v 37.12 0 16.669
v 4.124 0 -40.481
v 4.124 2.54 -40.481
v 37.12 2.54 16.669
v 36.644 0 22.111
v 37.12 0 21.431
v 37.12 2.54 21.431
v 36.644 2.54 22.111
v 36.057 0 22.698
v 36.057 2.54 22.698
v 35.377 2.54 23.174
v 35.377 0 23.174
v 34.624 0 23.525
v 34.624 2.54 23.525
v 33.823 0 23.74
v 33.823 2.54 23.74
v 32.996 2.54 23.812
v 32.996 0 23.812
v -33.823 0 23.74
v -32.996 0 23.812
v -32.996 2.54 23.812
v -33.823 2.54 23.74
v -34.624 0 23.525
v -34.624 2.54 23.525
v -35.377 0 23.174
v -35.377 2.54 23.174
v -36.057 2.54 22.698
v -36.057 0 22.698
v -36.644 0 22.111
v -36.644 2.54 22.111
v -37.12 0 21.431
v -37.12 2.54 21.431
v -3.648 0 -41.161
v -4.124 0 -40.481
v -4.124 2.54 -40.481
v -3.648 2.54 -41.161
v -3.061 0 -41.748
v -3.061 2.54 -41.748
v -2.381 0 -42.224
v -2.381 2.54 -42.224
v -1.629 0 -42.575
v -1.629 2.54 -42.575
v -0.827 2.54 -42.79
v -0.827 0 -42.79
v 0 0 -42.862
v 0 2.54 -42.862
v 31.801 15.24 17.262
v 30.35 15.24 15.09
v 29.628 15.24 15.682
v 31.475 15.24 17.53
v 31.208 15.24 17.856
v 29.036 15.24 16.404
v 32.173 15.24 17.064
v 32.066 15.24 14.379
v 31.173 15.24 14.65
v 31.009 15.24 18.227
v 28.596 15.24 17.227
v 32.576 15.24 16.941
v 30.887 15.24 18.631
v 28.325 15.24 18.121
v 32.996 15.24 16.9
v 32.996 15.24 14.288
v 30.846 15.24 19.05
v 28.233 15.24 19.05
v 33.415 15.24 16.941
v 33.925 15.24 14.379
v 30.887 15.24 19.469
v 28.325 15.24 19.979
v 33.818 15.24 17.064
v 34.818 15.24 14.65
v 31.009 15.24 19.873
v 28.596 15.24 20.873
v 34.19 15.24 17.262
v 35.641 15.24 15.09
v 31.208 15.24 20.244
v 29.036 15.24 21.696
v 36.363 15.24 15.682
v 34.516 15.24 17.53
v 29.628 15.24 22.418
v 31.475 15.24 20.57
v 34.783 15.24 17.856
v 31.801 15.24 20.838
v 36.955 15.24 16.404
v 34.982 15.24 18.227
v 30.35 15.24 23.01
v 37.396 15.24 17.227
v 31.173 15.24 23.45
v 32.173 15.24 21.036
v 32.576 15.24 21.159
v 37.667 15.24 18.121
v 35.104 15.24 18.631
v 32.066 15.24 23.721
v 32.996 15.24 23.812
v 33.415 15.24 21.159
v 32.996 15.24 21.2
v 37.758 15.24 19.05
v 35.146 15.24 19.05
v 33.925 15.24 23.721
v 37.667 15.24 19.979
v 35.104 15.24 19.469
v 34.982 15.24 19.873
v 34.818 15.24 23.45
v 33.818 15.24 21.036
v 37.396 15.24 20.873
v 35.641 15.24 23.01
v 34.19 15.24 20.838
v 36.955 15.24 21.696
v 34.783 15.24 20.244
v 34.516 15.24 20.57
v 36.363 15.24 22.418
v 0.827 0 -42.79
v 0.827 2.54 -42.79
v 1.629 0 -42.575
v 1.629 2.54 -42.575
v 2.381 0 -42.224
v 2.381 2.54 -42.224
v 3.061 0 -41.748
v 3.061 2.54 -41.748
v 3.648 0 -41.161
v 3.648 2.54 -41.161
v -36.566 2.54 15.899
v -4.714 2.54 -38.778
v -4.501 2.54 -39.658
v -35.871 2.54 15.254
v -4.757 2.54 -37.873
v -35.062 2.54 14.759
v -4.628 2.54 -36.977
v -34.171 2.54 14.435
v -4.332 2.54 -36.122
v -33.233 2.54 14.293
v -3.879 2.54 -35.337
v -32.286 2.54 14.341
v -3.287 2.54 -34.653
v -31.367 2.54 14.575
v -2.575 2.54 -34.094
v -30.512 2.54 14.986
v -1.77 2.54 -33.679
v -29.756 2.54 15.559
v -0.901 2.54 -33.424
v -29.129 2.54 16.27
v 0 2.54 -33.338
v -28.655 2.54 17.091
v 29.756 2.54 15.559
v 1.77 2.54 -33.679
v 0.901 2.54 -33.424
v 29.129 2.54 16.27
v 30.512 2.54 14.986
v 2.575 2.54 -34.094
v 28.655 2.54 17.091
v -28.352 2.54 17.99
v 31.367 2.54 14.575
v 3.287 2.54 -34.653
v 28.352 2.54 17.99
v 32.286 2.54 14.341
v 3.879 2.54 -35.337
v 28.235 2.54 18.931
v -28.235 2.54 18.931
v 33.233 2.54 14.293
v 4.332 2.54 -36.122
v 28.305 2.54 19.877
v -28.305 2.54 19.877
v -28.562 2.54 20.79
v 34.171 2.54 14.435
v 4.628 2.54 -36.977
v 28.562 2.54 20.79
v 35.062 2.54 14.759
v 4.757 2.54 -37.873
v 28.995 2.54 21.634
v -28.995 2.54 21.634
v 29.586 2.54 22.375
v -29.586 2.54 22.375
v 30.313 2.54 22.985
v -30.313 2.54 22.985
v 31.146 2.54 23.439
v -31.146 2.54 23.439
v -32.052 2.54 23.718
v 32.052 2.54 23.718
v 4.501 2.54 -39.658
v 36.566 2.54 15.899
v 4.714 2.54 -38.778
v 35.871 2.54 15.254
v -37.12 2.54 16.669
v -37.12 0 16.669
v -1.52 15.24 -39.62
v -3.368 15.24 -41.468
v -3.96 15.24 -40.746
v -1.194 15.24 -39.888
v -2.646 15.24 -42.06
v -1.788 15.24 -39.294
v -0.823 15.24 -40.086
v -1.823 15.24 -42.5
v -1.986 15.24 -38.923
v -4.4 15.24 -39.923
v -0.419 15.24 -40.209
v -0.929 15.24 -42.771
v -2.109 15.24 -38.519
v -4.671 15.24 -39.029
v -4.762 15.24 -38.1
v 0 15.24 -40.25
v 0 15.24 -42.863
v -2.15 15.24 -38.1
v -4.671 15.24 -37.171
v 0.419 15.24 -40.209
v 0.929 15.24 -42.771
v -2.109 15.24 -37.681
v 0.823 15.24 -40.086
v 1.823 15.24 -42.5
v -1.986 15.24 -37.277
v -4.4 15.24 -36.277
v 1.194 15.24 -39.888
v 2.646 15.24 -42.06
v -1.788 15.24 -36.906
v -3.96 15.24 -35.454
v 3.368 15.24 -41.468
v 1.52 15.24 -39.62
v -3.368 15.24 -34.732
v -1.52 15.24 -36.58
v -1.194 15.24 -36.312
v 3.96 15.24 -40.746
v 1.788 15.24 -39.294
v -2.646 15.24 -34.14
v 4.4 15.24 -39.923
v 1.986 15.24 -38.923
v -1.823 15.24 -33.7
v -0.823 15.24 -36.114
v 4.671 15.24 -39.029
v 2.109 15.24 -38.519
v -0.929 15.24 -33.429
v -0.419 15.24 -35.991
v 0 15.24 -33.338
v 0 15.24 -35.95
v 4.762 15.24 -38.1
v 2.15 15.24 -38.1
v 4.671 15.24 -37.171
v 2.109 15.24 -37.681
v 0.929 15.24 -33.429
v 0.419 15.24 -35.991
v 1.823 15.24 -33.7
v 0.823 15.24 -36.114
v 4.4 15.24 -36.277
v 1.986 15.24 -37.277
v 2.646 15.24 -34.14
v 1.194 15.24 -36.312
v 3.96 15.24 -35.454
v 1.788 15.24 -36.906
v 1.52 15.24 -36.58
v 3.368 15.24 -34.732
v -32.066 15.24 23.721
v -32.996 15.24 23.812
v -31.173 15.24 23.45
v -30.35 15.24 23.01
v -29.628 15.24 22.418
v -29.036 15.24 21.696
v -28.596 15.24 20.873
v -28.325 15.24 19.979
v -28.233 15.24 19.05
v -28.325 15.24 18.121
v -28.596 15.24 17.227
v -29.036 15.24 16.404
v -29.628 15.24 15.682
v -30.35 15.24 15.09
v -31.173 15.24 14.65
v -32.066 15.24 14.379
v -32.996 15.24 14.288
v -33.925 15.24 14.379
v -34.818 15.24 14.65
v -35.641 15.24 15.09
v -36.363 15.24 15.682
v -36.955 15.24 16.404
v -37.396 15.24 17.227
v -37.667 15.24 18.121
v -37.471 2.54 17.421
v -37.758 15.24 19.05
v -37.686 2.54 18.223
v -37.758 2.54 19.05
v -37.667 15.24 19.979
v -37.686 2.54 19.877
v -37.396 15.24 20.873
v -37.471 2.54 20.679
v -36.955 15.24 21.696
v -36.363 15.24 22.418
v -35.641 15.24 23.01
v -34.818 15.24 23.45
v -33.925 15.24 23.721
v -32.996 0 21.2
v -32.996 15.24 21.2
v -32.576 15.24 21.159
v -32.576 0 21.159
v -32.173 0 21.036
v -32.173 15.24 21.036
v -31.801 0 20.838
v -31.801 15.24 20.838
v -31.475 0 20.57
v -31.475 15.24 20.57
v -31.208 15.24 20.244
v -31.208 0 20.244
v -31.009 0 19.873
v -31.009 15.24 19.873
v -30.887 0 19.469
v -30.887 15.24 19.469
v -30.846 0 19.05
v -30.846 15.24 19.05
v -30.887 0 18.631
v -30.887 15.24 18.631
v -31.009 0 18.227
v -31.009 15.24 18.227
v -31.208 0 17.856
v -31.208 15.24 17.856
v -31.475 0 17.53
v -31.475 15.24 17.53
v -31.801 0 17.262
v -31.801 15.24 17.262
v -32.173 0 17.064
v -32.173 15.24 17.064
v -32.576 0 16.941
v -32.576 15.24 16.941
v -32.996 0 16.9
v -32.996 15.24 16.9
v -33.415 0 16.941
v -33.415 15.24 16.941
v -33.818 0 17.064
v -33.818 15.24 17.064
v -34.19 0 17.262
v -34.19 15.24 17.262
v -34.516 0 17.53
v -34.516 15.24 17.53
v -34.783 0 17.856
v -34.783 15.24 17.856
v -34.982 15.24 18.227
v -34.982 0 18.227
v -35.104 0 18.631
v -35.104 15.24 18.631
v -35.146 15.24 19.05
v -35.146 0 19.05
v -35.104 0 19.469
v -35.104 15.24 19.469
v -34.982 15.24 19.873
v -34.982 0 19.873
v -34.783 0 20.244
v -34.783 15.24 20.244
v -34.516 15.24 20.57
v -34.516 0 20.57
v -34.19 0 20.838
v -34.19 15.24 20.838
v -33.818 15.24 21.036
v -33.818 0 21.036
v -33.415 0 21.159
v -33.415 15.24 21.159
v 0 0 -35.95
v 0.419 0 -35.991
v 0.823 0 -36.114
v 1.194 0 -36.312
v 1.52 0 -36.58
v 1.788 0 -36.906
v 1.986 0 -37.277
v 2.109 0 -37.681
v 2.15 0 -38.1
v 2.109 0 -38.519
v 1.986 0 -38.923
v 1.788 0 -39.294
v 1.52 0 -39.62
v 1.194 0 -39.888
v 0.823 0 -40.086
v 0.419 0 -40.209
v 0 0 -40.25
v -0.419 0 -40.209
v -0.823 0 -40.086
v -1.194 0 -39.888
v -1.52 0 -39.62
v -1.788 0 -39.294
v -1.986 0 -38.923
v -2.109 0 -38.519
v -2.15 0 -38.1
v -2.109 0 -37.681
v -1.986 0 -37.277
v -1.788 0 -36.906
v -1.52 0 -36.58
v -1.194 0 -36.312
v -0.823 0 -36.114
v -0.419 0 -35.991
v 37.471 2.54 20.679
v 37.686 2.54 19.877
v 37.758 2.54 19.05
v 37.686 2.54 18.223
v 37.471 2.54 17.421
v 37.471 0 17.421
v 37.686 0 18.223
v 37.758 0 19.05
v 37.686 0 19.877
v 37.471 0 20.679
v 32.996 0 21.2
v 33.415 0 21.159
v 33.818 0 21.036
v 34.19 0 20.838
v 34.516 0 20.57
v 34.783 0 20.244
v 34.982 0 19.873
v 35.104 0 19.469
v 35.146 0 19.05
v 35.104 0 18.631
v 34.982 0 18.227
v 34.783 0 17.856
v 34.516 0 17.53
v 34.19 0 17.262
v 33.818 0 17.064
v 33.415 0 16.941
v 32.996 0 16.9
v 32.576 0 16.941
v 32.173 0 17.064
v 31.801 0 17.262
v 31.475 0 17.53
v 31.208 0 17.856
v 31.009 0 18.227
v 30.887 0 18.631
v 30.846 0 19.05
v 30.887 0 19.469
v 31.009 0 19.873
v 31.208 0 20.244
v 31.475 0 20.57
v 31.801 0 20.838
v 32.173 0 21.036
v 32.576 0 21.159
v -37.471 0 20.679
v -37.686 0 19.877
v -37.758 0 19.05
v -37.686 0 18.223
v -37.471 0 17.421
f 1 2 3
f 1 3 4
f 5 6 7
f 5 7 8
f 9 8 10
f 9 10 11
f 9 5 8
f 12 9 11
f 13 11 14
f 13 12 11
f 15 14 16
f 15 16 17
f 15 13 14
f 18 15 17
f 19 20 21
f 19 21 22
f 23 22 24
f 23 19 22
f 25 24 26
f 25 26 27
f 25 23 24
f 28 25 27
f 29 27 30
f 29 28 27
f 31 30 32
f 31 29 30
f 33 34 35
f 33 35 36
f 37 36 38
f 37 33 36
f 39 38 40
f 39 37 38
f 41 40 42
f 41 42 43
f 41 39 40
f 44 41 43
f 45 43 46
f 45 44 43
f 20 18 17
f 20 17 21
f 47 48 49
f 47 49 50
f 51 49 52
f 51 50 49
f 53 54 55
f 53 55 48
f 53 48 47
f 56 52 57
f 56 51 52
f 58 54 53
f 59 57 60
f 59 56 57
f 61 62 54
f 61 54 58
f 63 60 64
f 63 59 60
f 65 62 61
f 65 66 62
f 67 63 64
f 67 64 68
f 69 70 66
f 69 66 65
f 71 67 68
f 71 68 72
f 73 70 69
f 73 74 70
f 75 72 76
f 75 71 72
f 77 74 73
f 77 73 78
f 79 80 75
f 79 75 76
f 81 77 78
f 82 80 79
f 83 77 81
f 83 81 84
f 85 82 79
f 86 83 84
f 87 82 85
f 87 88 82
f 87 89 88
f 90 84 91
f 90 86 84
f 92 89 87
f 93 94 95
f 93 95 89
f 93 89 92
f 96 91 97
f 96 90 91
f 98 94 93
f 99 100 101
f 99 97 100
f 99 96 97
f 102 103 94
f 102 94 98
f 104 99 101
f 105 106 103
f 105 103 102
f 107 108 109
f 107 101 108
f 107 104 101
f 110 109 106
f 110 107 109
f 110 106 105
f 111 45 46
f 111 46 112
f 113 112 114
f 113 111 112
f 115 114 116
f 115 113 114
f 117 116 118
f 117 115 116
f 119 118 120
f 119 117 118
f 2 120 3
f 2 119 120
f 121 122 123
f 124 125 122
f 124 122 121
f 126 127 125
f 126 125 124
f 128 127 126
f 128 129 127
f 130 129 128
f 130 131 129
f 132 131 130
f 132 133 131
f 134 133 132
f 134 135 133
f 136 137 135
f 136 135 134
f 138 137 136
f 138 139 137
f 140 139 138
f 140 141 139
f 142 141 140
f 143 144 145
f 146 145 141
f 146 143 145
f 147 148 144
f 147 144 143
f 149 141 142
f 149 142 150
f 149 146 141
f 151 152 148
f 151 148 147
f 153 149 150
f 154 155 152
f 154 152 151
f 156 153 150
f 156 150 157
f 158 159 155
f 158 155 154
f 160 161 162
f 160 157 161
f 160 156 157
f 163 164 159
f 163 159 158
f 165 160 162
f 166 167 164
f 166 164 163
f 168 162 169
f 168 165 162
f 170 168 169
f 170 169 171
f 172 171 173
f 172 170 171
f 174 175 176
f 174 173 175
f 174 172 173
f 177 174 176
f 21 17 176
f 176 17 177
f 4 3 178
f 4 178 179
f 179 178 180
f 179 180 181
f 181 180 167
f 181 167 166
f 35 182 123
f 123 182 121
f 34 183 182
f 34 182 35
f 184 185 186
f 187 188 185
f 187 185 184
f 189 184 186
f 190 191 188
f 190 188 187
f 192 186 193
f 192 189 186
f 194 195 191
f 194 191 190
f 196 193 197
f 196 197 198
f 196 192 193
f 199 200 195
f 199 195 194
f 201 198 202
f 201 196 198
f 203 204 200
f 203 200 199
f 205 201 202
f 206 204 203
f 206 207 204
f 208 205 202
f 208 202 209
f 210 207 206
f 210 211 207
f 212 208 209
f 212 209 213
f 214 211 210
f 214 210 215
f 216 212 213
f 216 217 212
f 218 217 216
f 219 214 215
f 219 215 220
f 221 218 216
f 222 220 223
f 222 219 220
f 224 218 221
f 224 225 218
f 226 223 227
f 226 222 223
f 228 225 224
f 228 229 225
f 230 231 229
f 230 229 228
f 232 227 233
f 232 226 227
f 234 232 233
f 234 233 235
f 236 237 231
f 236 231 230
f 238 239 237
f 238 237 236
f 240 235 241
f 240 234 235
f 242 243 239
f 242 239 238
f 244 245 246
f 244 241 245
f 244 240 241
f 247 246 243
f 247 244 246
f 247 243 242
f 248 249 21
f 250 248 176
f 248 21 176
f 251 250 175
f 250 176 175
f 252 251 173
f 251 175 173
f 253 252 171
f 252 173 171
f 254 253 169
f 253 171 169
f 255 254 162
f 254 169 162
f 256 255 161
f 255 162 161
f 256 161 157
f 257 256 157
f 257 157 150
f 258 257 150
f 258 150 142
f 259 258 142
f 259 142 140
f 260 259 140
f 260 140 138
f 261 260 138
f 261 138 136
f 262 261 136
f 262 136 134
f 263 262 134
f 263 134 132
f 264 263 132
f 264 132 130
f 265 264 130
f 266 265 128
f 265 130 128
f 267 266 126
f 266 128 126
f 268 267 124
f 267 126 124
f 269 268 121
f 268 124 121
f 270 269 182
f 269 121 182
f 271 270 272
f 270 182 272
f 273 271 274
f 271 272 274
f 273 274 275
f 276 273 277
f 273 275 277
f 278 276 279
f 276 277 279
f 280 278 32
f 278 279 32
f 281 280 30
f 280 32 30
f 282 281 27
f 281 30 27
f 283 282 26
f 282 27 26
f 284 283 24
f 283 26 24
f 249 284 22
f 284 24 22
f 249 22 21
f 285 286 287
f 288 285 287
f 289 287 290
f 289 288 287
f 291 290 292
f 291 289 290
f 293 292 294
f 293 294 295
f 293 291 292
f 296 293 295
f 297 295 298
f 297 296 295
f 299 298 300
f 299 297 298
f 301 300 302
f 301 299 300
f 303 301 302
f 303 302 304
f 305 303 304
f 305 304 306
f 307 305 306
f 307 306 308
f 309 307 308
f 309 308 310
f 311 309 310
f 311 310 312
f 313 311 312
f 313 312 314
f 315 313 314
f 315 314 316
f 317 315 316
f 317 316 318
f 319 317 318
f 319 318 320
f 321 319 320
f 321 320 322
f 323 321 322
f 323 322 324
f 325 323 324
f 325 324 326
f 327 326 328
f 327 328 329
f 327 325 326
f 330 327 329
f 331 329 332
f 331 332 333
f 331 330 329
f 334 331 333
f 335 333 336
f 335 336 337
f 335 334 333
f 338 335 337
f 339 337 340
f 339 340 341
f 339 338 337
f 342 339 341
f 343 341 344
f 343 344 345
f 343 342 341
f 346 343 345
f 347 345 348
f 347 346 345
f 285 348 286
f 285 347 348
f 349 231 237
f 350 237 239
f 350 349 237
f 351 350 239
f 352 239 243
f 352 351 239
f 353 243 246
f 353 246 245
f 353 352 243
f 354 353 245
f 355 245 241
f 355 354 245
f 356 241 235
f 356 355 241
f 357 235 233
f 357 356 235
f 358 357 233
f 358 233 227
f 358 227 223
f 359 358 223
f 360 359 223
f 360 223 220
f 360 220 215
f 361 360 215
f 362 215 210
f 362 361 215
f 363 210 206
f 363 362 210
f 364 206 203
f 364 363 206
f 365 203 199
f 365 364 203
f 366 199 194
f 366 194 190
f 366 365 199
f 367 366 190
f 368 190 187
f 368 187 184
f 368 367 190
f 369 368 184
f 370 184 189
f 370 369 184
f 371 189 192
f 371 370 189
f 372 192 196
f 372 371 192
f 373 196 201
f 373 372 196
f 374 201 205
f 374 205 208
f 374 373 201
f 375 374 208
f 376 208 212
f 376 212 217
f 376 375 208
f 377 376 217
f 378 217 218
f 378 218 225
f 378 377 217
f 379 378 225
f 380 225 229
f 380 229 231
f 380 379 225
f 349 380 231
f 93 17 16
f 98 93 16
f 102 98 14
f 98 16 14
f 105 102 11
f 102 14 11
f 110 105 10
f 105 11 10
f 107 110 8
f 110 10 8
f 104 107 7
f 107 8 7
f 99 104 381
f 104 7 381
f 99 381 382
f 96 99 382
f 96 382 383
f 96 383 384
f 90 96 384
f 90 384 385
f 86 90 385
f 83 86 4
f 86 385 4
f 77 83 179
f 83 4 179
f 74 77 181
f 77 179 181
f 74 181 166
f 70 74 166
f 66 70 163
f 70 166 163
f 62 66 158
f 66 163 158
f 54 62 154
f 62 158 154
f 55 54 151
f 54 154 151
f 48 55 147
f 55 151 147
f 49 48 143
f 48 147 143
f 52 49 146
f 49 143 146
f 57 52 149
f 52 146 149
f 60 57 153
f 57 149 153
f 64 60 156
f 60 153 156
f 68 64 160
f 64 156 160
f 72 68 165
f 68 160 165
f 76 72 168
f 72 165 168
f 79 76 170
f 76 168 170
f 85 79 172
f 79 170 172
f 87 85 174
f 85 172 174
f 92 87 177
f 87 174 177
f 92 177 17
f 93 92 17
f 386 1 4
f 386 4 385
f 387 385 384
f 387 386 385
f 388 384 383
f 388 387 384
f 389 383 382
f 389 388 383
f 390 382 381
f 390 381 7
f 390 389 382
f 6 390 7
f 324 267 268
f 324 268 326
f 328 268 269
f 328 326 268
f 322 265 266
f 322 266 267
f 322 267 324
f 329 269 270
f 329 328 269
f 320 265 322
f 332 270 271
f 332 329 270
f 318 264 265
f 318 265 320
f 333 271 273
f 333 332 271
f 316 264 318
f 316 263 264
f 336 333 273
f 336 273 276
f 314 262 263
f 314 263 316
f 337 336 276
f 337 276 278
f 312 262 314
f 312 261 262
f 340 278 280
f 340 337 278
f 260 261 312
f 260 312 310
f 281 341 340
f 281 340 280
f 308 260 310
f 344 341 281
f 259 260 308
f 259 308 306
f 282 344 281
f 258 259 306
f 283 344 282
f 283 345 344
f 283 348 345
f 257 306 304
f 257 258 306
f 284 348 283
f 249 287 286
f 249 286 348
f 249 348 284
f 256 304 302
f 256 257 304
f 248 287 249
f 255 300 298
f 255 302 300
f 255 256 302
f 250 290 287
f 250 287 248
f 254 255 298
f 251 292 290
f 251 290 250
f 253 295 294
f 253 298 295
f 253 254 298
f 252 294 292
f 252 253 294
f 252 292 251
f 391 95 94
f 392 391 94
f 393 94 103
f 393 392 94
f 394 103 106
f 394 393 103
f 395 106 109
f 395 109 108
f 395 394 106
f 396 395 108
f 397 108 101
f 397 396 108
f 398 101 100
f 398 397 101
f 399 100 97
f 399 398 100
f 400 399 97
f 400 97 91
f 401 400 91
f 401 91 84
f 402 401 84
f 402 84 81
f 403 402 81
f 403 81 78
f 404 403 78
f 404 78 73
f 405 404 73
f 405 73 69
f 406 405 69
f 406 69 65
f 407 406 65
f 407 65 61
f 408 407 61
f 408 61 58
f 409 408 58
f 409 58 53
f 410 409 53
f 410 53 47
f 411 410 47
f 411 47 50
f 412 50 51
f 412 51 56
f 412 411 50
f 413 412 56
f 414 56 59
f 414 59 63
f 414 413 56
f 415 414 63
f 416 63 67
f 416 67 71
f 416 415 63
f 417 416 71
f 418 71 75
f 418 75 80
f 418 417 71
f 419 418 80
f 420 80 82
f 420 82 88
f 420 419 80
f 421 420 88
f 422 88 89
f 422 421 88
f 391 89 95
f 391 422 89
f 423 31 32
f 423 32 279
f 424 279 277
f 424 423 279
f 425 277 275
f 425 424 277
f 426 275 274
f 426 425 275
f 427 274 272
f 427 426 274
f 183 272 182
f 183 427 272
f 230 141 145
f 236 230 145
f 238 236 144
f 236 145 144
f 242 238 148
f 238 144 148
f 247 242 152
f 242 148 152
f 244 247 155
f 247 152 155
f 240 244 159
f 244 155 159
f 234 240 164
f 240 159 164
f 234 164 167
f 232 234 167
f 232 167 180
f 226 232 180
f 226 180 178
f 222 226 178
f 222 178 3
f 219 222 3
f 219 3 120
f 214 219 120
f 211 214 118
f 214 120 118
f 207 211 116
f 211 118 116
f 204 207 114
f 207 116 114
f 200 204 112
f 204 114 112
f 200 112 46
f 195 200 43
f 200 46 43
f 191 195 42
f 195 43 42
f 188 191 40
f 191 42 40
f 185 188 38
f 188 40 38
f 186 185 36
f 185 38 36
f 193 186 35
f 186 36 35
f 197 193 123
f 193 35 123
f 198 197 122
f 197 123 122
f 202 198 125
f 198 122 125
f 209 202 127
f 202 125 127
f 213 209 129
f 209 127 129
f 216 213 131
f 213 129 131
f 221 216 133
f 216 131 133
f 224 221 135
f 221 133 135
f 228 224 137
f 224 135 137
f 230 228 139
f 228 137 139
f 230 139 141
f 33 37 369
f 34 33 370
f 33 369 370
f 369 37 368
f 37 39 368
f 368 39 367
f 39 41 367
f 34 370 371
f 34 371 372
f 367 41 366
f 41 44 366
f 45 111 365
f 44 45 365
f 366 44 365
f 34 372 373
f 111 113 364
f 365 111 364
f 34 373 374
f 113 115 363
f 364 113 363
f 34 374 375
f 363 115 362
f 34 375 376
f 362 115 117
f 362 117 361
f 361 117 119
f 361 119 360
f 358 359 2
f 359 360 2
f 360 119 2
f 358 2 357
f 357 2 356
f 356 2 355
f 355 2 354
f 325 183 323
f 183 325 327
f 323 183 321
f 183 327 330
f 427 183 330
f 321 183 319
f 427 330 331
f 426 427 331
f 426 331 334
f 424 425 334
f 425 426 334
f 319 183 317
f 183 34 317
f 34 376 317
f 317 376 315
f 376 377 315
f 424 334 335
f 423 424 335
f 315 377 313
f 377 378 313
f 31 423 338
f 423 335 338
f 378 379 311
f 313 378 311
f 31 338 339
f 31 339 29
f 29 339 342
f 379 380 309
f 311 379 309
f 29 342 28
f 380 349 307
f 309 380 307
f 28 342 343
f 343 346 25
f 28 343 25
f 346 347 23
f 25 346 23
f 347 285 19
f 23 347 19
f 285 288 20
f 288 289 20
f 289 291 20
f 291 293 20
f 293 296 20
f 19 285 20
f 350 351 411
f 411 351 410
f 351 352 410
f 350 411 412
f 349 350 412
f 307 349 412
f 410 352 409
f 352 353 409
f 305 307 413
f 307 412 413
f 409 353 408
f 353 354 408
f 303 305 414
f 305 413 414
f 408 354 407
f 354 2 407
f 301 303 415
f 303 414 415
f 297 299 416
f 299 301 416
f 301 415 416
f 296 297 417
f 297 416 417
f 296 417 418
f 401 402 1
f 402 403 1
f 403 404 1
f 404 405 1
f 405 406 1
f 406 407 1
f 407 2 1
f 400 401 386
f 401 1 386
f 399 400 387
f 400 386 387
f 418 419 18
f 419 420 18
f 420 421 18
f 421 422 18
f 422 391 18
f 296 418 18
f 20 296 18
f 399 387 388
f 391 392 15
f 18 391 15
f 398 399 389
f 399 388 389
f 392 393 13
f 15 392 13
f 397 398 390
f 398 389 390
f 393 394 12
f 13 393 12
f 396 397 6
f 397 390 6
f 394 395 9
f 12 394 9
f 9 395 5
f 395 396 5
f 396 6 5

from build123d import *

# Parameters (mm, degrees)
SKETCH1_R           = 42.8625
SKETCH1_R_2         = 2.15
BOSS_EXTRUDE1_DEPTH = 2.54
CUT_EXTRUDE1_START  = -2.54
CUT_EXTRUDE1_DEPTH  = 2.54
SKETCH6_R           = 4.7625
SKETCH6_R_2         = 2.15
BOSS_EXTRUDE4_DEPTH = 12.7


with BuildPart() as part:
    # Sketch1 → Boss-Extrude1 (new body)
    with BuildSketch(Plane(origin=(0, 0, 0), x_dir=(1, 0, 0), z_dir=(0, 1, 0))):
        Circle(SKETCH1_R)
        with Locations((0, 38.1)):
            Circle(SKETCH1_R_2, mode=Mode.SUBTRACT)
        with Locations((32.995567884, -19.05)):
            Circle(SKETCH1_R_2, mode=Mode.SUBTRACT)
        with Locations((-32.995567884, -19.05)):
            Circle(SKETCH1_R_2, mode=Mode.SUBTRACT)
    extrude(amount=BOSS_EXTRUDE1_DEPTH)

    # Sketch2 → Cut-Extrude1 (cut)
    with BuildSketch(Plane(origin=(0, 2.54, 0), x_dir=(1, 0, 0), z_dir=(0, 1, 0)).offset(CUT_EXTRUDE1_START)):
        with BuildLine():
            Line((-37.12001387, -16.66875), (-4.124445986, 40.48125))
            ThreePointArc((-4.124445986, 40.48125), (-2.381249978, 42.224445998), (5.1e-08, 42.8625))
            ThreePointArc((5.1e-08, 42.8625), (-37.120013889, 21.431249967), (-37.120013806, -21.431250111))
            ThreePointArc((-37.120013806, -21.431250111), (-37.758067884, -19.050000064), (-37.12001387, -16.66875))
        make_face()
        with BuildLine():
            ThreePointArc((37.120013869, -21.431250002), (37.120013883, 21.431249977), (5.1e-08, 42.8625))
            ThreePointArc((5.1e-08, 42.8625), (2.381250022, 42.224445973), (4.124445986, 40.48125))
            Line((4.124445986, 40.48125), (37.12001387, -16.66875))
            ThreePointArc((37.12001387, -16.66875), (37.758067884, -19.050000001), (37.120013869, -21.431250002))
        make_face()
        with BuildLine():
            ThreePointArc((-32.995567884, -23.8125), (-35.376817829, -23.174446018), (-37.120013806, -21.431250111))
            ThreePointArc((-37.120013806, -21.431250111), (6.3e-08, -42.8625), (37.120013869, -21.431250002))
            ThreePointArc((37.120013869, -21.431250002), (35.376817883, -23.174445986), (32.995567884, -23.8125))
            Line((32.995567884, -23.8125), (-32.995567884, -23.8125))
        make_face()
    extrude(amount=CUT_EXTRUDE1_DEPTH, mode=Mode.SUBTRACT)

    # Sketch6 → Boss-Extrude4 (add)
    # profile 1 of 3: a face of its own
    with BuildSketch(Plane(origin=(0, 2.54, 0), x_dir=(1, 0, 0), z_dir=(0, 1, 0))):
        with Locations((0, 38.1)):
            Circle(SKETCH6_R)
        with Locations((0, 38.1)):
            Circle(SKETCH6_R_2, mode=Mode.SUBTRACT)
    # profile 2 of 3: a face of its own
    with BuildSketch(Plane(origin=(0, 2.54, 0), x_dir=(1, 0, 0), z_dir=(0, 1, 0))):
        with Locations((32.995567884, -19.05)):
            Circle(SKETCH6_R)
        with Locations((32.995567884, -19.05)):
            Circle(SKETCH6_R_2, mode=Mode.SUBTRACT)
    # profile 3 of 3: a face of its own
    with BuildSketch(Plane(origin=(0, 2.54, 0), x_dir=(1, 0, 0), z_dir=(0, 1, 0))):
        with Locations((-32.995567884, -19.05)):
            Circle(SKETCH6_R)
        with Locations((-32.995567884, -19.05)):
            Circle(SKETCH6_R_2, mode=Mode.SUBTRACT)
    extrude(amount=BOSS_EXTRUDE4_DEPTH)


solid = part.part
